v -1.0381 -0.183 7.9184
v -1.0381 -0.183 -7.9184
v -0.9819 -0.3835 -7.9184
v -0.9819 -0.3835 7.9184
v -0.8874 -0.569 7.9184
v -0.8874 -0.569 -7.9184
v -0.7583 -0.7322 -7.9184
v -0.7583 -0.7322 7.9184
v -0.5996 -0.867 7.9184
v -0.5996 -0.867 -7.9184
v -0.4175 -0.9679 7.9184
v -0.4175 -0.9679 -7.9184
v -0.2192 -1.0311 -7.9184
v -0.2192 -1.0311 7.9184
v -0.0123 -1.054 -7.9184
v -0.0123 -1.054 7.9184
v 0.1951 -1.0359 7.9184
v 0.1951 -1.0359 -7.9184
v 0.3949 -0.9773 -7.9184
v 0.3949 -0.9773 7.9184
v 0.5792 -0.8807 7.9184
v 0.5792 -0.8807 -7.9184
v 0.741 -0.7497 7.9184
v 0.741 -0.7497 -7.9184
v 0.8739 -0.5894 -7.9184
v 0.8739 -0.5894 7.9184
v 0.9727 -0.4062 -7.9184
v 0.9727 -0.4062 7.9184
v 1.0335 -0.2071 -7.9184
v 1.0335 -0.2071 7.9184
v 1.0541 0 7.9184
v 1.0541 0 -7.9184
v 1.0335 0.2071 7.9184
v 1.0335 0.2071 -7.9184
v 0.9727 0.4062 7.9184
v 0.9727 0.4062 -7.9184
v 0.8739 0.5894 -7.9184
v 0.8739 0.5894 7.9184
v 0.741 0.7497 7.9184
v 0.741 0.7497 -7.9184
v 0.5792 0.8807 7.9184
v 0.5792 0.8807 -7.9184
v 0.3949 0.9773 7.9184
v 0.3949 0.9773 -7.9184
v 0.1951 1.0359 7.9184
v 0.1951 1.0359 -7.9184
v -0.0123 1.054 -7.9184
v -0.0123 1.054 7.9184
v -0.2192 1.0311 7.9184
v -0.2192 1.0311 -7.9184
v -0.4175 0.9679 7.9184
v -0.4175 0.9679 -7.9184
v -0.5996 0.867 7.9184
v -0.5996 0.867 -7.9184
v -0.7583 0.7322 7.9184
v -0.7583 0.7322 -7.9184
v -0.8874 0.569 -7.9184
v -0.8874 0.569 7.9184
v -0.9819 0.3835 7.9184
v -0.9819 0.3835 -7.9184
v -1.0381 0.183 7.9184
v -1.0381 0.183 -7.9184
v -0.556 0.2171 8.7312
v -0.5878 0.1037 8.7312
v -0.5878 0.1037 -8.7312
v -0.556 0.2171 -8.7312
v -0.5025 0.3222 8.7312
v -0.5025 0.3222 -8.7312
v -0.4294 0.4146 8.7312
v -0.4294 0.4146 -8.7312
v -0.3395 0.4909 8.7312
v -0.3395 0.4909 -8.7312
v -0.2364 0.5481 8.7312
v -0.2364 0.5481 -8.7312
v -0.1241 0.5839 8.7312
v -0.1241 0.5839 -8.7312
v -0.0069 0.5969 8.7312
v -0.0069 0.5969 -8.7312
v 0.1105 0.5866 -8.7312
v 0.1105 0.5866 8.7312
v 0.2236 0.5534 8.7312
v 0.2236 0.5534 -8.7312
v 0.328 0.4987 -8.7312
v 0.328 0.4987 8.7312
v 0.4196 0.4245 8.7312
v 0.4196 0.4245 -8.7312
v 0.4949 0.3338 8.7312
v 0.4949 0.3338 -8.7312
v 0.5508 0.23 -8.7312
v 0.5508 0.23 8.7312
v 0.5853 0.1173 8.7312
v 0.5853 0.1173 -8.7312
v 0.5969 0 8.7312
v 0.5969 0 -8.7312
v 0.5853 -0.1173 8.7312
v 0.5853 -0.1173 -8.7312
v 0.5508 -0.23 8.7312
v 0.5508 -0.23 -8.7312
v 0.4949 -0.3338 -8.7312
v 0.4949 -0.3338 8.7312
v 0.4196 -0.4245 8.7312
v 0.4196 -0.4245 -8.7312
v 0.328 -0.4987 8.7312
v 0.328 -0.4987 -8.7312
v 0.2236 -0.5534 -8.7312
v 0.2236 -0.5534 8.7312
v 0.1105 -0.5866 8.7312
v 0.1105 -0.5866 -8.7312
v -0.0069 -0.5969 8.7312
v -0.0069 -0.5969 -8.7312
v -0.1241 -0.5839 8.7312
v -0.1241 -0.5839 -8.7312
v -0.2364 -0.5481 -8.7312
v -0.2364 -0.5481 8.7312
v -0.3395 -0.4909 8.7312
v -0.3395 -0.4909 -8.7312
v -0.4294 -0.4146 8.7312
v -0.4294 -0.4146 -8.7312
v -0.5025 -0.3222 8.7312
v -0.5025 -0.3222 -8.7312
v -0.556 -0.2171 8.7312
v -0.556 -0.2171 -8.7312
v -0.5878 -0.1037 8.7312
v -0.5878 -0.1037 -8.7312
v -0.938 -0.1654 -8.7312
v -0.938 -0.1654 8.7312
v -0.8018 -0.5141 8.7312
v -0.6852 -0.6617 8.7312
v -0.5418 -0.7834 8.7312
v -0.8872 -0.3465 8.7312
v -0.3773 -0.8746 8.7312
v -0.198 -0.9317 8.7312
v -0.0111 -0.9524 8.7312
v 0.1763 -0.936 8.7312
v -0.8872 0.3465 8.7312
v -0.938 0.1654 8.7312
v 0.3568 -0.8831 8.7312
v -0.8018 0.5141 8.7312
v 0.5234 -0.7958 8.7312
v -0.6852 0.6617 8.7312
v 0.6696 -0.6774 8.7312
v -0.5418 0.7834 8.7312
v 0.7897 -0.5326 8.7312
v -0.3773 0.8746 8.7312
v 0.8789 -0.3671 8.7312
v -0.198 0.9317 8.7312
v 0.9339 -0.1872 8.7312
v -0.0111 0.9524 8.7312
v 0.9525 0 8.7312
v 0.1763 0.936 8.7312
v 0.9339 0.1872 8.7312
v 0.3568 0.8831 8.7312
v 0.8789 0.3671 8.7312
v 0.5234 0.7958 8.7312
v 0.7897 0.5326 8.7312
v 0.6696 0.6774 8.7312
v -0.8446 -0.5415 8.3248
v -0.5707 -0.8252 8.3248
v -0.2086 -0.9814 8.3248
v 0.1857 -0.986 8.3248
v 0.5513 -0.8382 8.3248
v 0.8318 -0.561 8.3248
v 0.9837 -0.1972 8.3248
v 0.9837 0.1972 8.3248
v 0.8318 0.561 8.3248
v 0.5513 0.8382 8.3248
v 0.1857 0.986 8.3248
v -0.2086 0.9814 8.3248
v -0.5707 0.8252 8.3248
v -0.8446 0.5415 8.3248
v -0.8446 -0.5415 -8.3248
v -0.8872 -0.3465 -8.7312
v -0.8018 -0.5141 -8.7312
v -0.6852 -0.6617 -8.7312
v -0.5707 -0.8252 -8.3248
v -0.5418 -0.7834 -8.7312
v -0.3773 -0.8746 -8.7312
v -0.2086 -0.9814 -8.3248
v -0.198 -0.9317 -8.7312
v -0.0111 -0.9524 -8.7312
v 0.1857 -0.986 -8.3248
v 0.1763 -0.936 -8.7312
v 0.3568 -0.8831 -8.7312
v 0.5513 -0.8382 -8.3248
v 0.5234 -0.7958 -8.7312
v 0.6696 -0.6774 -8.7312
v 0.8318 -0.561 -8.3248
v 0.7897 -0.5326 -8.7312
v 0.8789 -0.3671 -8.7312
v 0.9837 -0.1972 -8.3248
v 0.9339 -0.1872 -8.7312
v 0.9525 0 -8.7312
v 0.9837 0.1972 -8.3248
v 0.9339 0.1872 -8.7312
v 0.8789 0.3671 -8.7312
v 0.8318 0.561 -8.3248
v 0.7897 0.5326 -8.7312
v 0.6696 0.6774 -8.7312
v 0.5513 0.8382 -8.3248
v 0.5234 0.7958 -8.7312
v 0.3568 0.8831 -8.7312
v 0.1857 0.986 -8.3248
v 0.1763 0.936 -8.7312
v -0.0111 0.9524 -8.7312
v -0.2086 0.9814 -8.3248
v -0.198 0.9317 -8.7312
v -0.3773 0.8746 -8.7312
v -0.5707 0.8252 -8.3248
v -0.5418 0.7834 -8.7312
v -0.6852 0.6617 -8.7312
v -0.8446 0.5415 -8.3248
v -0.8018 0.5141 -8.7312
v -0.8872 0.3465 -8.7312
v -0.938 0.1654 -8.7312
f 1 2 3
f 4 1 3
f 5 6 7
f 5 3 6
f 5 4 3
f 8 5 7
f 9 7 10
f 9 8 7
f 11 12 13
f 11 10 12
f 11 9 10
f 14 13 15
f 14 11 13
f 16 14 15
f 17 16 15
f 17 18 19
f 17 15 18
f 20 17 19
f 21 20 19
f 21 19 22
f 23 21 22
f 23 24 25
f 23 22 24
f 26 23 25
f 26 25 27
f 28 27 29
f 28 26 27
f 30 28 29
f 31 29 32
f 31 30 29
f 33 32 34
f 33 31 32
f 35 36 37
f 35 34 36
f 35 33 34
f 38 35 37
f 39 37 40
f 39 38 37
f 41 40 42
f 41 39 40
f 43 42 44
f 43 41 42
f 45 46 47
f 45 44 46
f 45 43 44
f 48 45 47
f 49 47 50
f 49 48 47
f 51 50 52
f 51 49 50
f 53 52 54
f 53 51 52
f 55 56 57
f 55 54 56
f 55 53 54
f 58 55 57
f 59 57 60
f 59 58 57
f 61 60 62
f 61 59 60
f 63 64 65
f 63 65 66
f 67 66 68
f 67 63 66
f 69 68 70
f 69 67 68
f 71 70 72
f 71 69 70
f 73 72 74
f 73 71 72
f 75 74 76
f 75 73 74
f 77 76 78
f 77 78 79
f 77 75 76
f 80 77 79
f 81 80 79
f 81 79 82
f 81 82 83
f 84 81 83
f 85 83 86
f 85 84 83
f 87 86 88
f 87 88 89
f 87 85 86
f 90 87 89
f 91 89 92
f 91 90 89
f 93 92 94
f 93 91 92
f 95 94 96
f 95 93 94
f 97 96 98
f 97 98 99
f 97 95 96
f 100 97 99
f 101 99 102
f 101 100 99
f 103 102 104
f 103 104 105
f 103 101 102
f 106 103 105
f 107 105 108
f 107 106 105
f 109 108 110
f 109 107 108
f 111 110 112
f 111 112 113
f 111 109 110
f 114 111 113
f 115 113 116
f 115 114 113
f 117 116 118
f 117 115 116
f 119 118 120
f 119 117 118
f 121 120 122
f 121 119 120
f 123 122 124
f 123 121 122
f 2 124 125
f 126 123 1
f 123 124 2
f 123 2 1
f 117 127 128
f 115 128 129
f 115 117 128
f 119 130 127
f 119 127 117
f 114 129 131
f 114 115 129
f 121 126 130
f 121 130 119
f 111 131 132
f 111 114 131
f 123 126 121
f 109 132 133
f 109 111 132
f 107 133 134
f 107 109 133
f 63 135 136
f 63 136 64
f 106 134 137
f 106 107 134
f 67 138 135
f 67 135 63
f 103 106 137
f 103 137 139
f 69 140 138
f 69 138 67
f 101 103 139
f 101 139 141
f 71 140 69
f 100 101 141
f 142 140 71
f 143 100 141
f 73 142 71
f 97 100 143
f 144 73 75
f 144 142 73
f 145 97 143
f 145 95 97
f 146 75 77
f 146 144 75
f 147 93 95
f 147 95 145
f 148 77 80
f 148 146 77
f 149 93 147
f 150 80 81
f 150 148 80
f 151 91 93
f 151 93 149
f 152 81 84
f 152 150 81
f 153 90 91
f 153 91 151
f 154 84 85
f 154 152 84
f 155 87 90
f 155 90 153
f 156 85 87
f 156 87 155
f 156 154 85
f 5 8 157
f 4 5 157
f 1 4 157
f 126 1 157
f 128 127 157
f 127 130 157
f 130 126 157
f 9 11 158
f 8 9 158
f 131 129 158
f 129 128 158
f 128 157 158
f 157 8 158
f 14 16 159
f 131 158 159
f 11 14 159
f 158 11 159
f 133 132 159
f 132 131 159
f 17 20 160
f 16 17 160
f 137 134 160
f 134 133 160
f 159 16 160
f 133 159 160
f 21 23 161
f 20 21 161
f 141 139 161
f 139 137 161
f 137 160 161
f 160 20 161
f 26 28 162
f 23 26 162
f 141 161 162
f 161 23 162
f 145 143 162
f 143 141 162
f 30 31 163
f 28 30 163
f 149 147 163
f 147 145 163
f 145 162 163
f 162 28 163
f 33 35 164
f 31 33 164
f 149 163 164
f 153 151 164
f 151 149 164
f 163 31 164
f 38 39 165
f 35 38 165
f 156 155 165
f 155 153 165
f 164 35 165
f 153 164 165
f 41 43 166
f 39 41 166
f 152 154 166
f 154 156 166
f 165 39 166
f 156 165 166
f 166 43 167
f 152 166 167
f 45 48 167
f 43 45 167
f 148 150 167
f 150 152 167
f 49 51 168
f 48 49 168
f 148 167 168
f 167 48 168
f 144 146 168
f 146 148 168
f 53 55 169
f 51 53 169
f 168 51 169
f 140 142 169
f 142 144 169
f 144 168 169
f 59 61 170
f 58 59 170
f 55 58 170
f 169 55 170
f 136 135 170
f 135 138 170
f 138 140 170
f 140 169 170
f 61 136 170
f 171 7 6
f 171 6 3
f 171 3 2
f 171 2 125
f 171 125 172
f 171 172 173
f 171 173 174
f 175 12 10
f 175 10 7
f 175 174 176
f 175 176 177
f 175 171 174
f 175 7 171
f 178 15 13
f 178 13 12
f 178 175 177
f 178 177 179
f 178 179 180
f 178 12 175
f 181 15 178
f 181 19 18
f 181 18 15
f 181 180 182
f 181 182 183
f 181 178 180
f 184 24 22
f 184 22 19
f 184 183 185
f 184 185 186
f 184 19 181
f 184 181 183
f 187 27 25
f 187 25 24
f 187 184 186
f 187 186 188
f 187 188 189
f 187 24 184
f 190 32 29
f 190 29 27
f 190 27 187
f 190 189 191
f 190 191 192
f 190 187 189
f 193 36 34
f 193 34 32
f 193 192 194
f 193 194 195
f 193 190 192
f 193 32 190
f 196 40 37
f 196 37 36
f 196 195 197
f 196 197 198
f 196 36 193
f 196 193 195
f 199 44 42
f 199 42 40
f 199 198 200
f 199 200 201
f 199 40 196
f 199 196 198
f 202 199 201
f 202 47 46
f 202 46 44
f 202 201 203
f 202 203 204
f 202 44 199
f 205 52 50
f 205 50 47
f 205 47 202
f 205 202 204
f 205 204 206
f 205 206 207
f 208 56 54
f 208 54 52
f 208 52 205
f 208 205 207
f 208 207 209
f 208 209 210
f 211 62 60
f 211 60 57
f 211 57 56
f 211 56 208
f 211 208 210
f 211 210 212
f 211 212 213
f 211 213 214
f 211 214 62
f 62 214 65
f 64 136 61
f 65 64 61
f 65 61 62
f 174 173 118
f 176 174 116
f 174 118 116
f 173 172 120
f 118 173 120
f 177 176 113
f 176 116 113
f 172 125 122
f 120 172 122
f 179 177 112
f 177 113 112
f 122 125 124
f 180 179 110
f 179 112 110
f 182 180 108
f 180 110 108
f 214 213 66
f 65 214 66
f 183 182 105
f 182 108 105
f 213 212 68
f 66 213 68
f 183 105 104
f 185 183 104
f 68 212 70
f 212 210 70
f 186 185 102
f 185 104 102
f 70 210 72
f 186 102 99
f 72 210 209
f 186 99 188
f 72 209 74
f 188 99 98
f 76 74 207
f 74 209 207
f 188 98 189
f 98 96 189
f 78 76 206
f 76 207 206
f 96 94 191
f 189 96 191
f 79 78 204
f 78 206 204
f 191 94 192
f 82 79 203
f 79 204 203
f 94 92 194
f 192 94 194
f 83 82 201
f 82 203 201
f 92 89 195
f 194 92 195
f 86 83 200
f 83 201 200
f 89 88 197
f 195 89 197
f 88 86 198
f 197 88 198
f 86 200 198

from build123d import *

# Parameters (mm, degrees)
EXTRUDE1_DEPTH = 8.73125


with BuildPart() as part:
    # Sketch1 → Extrude1 (new body, symmetric)
    with BuildSketch(Plane.XY):
        with BuildLine():
            Line((-1.038085852, 0.183042544), (-0.587831748, 0.103650597))
            ThreePointArc((-0.587831748, 0.103650597), (0.5969, 0), (-0.587831748, -0.103650597))
            Line((-0.587831748, -0.103650597), (-1.038085852, -0.183042544))
            ThreePointArc((-1.038085852, -0.183042544), (1.0541, 0), (-1.038085852, 0.183042544))
        make_face()
    extrude(amount=EXTRUDE1_DEPTH, both=True)

    # Sketch2 → Cut-Revolve1 (revolve, cut)
    with BuildSketch(Plane(origin=(0, 0, 0), x_dir=(0, 0, -1), z_dir=(1, 0, 0))):
        Polygon((8.73125, 1.0541), (8.73125, 0.9525), (7.91845, 1.0541), align=None)
        Polygon((-7.91845, 1.0541), (-8.73125, 1.0541), (-8.73125, 0.9525), align=None)
    revolve(axis=Axis((0, 0, -8.73125), (0, 0, 1)), mode=Mode.SUBTRACT)


solid = part.part
